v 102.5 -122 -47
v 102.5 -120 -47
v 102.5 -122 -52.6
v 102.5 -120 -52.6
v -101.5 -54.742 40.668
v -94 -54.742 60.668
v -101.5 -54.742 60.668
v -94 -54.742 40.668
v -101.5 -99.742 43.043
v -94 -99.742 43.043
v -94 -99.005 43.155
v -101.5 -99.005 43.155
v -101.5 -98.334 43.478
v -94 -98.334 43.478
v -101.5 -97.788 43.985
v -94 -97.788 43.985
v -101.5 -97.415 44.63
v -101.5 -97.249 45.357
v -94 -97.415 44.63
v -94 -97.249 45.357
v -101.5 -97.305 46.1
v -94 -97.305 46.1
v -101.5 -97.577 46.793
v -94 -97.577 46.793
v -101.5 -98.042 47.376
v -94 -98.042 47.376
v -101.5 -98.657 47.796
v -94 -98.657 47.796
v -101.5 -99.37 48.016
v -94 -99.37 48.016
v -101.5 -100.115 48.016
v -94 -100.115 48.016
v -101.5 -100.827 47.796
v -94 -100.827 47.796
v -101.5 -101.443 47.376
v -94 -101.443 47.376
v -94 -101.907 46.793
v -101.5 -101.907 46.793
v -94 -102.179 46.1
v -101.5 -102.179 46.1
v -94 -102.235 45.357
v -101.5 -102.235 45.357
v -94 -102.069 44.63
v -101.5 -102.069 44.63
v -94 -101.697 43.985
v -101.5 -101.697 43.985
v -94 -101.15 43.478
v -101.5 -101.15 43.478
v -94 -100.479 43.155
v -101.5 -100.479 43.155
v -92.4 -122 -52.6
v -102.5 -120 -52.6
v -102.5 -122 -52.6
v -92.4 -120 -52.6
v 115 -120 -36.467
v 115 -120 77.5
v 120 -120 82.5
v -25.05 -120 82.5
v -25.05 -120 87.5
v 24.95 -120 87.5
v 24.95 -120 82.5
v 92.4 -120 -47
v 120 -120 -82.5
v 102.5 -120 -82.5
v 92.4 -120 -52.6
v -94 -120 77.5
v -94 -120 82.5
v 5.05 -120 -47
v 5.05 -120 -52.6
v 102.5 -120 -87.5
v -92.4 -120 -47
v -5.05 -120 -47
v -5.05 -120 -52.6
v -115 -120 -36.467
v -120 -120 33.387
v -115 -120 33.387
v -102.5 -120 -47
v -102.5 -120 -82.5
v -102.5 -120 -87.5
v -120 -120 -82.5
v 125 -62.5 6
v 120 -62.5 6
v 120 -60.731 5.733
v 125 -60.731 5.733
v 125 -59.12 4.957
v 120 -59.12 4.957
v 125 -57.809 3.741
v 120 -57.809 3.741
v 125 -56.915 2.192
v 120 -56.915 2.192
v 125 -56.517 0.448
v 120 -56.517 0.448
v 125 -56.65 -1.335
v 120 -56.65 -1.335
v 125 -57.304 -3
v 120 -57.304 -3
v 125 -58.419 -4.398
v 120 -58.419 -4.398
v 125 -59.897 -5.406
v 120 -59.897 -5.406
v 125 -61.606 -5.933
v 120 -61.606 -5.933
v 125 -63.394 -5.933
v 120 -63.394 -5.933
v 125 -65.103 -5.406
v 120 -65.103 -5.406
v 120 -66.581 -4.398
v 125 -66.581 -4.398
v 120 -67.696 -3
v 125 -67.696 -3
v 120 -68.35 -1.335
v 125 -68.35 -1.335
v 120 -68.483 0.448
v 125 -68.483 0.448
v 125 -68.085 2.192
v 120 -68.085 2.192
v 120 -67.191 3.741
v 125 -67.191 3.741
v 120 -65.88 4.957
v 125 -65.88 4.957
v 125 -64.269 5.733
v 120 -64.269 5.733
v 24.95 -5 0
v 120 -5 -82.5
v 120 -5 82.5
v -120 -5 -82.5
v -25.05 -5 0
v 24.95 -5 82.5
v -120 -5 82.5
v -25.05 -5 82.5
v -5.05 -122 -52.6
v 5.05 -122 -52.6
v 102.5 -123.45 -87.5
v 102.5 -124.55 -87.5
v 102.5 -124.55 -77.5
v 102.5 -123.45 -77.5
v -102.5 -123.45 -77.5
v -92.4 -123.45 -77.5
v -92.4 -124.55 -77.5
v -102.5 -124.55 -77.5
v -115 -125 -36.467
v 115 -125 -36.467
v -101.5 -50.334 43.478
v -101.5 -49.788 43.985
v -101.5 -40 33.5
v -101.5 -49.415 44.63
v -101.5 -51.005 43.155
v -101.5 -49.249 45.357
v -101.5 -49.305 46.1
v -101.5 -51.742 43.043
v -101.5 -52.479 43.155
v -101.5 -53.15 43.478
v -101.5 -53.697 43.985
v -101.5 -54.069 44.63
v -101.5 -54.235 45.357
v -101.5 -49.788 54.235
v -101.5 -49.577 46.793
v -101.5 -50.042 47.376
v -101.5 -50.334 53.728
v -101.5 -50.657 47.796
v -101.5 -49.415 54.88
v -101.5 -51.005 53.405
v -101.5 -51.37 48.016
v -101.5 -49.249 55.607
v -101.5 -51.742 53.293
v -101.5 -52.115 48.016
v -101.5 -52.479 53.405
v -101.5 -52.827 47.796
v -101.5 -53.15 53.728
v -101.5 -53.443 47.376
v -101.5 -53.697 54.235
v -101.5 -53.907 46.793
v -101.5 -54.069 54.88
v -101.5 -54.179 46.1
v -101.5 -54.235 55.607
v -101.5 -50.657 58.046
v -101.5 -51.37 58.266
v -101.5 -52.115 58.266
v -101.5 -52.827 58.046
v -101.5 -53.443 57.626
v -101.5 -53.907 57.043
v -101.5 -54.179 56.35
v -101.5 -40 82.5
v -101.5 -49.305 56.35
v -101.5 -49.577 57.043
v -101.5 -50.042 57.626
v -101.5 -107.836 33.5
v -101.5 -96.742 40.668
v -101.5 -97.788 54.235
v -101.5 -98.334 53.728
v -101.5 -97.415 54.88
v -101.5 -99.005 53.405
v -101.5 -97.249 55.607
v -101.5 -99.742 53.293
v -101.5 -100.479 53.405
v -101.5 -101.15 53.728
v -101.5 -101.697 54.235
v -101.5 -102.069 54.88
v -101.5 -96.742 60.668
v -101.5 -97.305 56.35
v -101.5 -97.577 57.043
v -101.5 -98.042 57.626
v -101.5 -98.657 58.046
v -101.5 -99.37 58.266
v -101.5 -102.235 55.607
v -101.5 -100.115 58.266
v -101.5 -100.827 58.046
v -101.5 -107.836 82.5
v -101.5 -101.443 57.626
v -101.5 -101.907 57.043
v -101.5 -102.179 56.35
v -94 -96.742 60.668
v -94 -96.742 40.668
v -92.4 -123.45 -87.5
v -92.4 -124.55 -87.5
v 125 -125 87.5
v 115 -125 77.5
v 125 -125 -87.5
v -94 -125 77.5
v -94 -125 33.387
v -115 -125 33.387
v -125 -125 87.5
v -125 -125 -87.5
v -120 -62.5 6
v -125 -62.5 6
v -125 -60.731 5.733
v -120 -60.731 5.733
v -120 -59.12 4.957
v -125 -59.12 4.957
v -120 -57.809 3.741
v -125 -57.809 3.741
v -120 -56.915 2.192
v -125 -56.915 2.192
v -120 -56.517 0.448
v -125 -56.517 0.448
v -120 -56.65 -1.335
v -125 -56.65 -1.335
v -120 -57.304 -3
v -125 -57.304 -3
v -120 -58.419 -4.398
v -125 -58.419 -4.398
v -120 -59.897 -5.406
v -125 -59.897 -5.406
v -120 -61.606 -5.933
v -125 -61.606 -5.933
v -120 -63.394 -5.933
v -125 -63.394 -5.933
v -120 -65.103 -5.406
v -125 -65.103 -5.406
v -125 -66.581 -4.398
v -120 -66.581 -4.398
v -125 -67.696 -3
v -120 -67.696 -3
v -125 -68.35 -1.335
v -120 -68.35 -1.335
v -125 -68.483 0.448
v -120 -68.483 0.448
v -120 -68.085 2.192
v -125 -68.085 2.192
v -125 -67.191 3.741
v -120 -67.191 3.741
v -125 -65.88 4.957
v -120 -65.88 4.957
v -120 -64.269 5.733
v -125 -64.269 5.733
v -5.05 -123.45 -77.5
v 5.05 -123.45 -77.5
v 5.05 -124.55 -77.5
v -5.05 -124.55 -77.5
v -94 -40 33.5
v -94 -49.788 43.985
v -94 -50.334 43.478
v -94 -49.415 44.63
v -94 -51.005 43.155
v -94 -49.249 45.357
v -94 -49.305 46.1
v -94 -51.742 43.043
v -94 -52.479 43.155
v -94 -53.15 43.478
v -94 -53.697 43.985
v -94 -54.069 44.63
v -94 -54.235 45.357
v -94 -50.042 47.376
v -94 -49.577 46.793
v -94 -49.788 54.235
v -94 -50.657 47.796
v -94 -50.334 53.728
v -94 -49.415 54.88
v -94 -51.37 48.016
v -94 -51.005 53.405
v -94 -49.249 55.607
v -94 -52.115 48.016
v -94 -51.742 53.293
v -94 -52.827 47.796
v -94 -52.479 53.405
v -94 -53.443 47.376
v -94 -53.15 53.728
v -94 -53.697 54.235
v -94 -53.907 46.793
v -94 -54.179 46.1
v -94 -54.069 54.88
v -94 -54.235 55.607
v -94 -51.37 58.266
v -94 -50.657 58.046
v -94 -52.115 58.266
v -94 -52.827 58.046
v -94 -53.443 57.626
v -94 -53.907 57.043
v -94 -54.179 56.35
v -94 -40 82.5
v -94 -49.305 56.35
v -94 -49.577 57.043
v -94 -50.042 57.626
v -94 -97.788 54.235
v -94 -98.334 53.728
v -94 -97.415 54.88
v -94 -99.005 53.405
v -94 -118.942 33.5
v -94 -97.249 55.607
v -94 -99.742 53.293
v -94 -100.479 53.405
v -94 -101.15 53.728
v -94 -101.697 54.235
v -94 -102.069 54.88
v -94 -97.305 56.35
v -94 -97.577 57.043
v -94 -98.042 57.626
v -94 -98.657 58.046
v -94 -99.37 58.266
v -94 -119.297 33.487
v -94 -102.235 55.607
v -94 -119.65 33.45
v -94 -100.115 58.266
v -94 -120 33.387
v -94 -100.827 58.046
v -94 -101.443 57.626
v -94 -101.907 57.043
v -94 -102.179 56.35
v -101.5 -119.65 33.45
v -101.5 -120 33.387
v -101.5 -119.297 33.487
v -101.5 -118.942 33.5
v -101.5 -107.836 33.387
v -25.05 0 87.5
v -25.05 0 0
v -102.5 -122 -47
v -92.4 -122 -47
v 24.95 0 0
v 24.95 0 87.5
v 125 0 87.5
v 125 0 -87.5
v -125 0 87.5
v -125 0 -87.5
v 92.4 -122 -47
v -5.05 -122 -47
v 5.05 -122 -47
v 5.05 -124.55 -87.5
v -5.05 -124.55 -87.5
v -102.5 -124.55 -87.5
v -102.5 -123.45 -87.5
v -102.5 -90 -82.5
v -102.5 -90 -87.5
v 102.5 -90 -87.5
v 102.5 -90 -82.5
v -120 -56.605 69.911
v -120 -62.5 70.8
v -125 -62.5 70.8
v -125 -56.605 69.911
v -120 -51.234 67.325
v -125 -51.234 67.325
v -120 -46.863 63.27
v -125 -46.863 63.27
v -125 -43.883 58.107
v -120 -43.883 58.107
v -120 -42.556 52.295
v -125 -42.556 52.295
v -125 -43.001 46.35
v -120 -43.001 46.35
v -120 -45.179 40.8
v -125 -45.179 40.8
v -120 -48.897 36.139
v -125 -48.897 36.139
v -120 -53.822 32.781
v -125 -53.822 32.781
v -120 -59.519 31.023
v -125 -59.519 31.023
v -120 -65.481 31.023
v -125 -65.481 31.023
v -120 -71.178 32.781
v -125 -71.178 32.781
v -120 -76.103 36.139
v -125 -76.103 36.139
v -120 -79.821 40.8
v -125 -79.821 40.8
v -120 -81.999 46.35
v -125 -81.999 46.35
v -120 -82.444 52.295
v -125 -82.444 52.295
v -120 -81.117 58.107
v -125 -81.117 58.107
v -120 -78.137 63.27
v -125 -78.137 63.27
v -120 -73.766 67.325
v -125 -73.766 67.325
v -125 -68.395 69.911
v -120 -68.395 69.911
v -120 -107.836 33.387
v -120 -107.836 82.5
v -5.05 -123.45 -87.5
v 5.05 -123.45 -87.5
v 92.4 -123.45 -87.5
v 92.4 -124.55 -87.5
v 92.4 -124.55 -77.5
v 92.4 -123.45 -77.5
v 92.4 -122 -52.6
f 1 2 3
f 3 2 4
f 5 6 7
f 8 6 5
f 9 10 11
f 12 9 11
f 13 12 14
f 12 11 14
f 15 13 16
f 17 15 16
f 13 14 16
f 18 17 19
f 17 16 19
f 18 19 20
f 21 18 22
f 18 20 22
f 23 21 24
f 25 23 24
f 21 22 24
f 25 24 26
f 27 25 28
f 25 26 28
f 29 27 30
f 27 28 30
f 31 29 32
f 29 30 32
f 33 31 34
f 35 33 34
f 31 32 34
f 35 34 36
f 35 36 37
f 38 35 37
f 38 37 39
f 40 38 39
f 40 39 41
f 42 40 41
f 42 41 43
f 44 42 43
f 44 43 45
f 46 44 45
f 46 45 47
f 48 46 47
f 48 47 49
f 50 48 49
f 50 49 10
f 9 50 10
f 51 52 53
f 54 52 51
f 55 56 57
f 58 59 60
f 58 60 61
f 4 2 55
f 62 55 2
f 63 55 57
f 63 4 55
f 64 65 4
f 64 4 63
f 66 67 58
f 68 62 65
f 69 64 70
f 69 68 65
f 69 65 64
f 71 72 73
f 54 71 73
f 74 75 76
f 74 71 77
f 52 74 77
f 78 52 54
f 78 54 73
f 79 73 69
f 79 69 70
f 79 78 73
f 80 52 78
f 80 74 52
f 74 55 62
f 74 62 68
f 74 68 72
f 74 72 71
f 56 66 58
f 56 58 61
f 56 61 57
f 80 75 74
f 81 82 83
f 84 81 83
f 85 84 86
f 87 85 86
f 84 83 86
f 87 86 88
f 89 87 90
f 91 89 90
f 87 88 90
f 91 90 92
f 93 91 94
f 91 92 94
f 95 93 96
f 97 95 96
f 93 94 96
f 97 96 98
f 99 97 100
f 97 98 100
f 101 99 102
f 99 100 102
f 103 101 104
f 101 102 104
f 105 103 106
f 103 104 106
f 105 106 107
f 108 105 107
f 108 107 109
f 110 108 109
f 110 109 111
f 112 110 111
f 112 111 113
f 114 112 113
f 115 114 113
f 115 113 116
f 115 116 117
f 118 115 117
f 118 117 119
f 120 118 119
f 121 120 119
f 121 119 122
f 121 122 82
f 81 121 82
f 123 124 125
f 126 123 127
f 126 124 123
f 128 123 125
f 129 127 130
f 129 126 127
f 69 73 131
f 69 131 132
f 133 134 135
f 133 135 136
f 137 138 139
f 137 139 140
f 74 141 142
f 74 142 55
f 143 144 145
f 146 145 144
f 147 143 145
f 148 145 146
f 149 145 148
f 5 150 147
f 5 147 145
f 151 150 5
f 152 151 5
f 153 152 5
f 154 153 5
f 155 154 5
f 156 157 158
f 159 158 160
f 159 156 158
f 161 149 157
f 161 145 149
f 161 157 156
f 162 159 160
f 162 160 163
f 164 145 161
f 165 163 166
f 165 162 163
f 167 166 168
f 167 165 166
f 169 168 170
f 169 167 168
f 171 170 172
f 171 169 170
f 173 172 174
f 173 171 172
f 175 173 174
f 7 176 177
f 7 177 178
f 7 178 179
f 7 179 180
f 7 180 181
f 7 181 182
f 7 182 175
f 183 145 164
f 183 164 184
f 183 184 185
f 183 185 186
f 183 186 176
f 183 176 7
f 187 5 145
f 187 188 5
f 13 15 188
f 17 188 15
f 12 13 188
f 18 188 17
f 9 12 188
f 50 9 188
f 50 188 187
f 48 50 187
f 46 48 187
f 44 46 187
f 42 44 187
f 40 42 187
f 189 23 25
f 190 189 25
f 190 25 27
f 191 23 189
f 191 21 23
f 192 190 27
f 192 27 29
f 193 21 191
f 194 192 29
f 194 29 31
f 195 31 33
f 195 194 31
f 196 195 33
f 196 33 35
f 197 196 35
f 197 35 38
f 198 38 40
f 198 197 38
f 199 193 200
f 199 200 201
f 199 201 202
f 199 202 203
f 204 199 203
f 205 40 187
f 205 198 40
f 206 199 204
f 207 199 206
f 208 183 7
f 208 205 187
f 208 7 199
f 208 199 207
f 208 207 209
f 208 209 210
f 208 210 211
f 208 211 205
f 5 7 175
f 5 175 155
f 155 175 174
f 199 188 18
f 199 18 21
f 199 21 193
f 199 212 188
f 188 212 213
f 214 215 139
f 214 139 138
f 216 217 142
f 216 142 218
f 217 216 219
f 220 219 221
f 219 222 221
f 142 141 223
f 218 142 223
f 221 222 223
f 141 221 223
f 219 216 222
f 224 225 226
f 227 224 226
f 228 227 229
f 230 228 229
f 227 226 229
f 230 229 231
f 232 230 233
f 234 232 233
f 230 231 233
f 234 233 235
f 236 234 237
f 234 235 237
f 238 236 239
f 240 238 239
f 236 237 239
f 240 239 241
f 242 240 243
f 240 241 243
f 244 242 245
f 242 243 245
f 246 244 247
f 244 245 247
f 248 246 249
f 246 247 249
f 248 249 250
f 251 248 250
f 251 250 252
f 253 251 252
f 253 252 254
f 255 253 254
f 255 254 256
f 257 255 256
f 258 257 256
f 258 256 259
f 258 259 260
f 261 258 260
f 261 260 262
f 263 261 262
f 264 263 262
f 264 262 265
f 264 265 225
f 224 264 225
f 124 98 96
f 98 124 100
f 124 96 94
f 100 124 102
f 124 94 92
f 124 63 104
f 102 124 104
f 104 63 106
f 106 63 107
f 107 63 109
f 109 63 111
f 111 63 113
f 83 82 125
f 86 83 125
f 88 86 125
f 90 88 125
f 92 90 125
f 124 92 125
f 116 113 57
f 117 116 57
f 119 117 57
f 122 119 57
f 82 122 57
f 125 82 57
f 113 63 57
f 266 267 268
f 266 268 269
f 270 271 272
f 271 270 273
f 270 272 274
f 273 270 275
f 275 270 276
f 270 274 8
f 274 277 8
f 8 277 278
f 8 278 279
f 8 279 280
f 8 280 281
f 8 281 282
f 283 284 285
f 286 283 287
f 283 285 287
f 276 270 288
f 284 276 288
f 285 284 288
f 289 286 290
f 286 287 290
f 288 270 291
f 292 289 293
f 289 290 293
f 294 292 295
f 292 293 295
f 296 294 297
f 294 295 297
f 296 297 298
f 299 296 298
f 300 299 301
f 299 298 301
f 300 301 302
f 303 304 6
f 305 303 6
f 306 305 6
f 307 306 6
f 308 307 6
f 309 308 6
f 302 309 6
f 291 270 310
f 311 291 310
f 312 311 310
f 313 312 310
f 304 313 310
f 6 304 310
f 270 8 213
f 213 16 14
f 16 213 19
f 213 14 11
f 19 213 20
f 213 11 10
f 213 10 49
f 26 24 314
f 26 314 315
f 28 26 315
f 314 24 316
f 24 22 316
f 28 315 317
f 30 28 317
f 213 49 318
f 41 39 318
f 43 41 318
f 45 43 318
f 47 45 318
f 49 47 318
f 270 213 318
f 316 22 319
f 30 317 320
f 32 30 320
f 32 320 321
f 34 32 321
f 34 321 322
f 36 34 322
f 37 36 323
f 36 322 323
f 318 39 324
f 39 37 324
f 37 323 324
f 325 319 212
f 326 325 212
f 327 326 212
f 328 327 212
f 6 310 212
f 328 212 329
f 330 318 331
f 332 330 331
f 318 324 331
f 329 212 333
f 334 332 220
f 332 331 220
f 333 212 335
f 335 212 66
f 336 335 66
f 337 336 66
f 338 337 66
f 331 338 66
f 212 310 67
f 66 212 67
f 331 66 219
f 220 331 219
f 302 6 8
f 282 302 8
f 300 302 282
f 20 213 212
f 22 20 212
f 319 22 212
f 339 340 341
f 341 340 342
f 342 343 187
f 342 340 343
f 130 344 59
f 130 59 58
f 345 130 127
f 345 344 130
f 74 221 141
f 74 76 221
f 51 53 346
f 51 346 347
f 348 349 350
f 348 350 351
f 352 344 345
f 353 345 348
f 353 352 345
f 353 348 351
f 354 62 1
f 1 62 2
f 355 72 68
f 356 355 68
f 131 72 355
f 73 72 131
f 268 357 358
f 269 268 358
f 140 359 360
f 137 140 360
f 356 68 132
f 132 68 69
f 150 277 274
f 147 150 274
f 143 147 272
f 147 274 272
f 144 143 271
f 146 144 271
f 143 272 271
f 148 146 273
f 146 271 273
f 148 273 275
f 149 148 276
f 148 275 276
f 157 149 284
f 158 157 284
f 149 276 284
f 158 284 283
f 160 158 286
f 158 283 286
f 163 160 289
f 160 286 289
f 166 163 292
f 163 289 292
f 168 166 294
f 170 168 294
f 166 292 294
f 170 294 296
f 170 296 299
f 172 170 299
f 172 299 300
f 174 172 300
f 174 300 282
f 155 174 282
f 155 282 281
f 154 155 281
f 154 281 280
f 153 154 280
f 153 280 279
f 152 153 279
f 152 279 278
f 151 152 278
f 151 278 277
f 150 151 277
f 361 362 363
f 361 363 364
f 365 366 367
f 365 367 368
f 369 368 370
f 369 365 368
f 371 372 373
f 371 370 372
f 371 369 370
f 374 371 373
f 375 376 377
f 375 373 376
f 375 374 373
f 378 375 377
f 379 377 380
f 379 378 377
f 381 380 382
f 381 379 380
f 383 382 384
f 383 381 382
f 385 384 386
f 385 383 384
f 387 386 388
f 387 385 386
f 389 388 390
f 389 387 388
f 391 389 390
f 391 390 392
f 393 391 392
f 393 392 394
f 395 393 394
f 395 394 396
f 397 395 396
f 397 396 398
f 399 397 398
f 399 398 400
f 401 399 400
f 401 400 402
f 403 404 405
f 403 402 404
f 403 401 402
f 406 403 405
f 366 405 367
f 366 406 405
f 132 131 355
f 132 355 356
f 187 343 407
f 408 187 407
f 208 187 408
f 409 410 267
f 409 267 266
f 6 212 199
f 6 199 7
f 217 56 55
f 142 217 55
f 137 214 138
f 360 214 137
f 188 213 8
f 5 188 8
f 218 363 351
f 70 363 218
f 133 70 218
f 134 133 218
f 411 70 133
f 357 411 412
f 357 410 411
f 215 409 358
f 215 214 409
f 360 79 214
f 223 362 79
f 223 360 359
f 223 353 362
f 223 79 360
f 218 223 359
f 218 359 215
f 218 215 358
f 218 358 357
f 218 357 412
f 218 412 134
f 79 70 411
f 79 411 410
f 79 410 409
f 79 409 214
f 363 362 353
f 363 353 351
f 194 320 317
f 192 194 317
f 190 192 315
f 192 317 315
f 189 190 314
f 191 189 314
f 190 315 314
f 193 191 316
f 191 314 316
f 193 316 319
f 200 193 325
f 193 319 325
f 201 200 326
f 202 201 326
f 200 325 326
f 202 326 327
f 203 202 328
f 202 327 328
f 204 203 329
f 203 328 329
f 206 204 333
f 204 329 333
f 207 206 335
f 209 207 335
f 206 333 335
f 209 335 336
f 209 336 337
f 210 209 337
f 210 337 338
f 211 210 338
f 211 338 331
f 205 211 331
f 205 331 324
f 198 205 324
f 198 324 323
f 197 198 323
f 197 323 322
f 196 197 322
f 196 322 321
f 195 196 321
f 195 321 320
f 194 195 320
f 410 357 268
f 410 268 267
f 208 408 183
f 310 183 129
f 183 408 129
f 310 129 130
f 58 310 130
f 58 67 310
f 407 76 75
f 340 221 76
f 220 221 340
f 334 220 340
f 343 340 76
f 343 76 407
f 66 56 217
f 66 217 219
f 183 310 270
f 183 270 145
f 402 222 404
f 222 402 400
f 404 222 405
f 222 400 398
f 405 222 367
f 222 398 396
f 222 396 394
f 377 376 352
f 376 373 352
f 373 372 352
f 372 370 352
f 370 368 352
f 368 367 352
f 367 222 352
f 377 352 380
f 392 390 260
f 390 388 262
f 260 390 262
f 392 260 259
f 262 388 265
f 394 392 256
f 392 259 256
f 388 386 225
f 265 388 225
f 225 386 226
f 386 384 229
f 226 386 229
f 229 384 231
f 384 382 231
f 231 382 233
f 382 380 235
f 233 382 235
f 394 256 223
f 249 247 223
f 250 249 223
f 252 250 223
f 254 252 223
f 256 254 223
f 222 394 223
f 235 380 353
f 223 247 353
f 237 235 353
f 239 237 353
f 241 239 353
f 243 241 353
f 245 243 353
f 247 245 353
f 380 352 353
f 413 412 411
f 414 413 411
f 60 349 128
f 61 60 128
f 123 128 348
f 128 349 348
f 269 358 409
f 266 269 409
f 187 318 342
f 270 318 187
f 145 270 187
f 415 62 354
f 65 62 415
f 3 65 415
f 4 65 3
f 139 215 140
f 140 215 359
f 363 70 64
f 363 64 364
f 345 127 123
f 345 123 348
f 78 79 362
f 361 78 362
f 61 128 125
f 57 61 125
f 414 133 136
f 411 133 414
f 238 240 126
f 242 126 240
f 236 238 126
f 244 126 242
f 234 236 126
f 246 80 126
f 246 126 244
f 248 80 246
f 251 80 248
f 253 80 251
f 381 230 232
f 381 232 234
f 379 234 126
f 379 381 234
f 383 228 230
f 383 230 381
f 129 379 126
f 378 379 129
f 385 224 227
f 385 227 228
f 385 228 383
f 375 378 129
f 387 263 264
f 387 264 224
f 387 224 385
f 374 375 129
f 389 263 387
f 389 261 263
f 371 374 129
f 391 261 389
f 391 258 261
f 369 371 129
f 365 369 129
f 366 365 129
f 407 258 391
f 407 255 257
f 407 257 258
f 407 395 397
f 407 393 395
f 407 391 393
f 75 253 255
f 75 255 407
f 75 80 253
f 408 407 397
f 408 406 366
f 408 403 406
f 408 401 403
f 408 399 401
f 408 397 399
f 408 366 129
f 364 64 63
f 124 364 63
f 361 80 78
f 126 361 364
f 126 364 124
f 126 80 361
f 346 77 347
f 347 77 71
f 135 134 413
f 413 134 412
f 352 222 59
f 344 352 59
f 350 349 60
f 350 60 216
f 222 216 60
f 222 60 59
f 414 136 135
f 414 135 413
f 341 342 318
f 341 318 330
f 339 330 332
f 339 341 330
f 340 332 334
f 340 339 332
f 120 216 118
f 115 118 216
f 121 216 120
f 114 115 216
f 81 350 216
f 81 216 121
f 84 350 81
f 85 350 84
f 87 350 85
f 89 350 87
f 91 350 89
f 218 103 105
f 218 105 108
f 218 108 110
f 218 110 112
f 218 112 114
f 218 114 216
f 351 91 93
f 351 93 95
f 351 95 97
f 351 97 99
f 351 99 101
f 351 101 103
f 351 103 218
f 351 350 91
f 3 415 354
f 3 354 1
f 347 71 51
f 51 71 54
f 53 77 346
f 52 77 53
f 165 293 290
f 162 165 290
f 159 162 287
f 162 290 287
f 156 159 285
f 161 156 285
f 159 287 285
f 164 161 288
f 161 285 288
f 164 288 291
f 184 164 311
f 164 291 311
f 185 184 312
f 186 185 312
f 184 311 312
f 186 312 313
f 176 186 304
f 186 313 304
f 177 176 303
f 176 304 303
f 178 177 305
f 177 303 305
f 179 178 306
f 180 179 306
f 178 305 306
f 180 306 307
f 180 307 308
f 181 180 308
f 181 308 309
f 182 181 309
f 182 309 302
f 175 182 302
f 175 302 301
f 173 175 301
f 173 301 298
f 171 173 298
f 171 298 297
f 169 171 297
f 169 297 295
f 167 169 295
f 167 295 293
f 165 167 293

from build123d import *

# Parameters (mm, degrees)
SKETCH1_W               = 250
SKETCH1_H               = 175
BOSS_EXTRUDE1_DEPTH     = 125
SKETCH2_W               = 240
SKETCH2_H               = 165
CUT_EXTRUDE1_DEPTH      = 120
SKETCH3_W               = 40.1
SKETCH3_H               = 165
CUT_EXTRUDE2_DEPTH      = 198.246672976
SKETCH6_W               = 250
SKETCH6_H               = 175
BOSS_EXTRUDE2_DEPTH     = 5
SKETCH7_W               = 205
SKETCH7_H               = 30
PIANO_PLUG_DEPTH        = 5
ARM_HOLE_REACH          = 199.247
SKETCH8_W               = 50
SKETCH8_H               = 180
BOSS_EXTRUDE8_REACH     = 216.001
SKETCH4_R               = 6
MAIN_SHAFT_HOLE_DEPTH   = 293.884362846
CUT_EXTRUDE8_DEPTH      = 16
CUT_EXTRUDE8_DEPTH_BACK = 33
SKETCH10_R              = 20
BOTTOM_OPEN_DEPTH       = 28
BOTTOM_OPEN_DEPTH_BACK  = 21
SKETCH11_W              = 230
SKETCH11_H              = 155
SKETCH12_W              = 41.033462292
SKETCH12_H              = 5
BOSS_EXTRUDE4_DEPTH     = 233
SKETCH13_W              = 7.5
SKETCH13_H              = 80
BOSS_EXTRUDE5_DEPTH     = 49
SKETCH14_W              = 44.113211518
SKETCH14_H              = 5
BOSS_EXTRUDE6_DEPTH     = 21
FILLET2_R               = 5
SKETCH16_R              = 2.5
SKETCH16_W              = 20
SKETCH16_H              = 42
SERVO_PLUG_HOLE_DEPTH   = 106
SKETCH17_W              = 49.113211518
SKETCH17_H              = 12.164138601
BOSS_EXTRUDE7_DEPTH     = 23
SKETCH19_W              = 10.1
SKETCH19_H              = 5.6
CUT_EXTRUDE9_DEPTH      = 2
SKETCH21_W              = 10.1
SKETCH21_H              = 1.1
CUT_EXTRUDE10_DEPTH     = 10


with BuildPart() as part:
    # Sketch1 → Boss-Extrude1 (new body)
    with BuildSketch(Plane(origin=(0, 0, 0), x_dir=(1, 0, 0), z_dir=(0, 1, 0))):
        Rectangle(SKETCH1_W, SKETCH1_H)
    extrude(amount=-BOSS_EXTRUDE1_DEPTH)

    # Sketch2 → Cut-Extrude1 (cut)
    with BuildSketch(Plane.XZ.offset(125)):
        Rectangle(SKETCH2_W, SKETCH2_H)
    extrude(amount=-CUT_EXTRUDE1_DEPTH, mode=Mode.SUBTRACT)

    # Sketch3 → Cut-Extrude2 (cut, through all)
    with BuildSketch(Plane(origin=(0, 0, 0), x_dir=(1, 0, 0), z_dir=(0, 1, 0))):
        Rectangle(SKETCH3_W, SKETCH3_H)
    extrude(amount=-CUT_EXTRUDE2_DEPTH, mode=Mode.SUBTRACT)

    # Sketch6 → Boss-Extrude2 (add)
    with BuildSketch(Plane.XZ.offset(125)):
        Rectangle(SKETCH6_W, SKETCH6_H)
    extrude(amount=-BOSS_EXTRUDE2_DEPTH)

    # Sketch7 → Piano Plug (cut)
    with BuildSketch(Plane(origin=(0, 0, -87.5), x_dir=(-1, 0, 0), z_dir=(0, 0, -1))):
        with Locations((0, -105)):
            Rectangle(SKETCH7_W, SKETCH7_H)
    extrude(amount=-PIANO_PLUG_DEPTH, mode=Mode.SUBTRACT)

    # Arm Hole: up to this face of the body (flat: up to its plane)
    arm_hole_end = Plane(part.part.faces().sort_by_distance((0, -120, -2.144615385))[0])
    # Sketch8 → Arm Hole (cut, up to the picked face)
    with BuildSketch(Plane(origin=(0, 0, 0), x_dir=(1, 0, 0), z_dir=(0, 1, 0)), mode=Mode.PRIVATE) as arm_hole_sk1:
        with Locations((-0.05, -2.5)):
            Rectangle(SKETCH8_W, SKETCH8_H)
    arm_hole_tool1 = split(extrude(arm_hole_sk1.sketch, amount=-ARM_HOLE_REACH, mode=Mode.PRIVATE), bisect_by=arm_hole_end, keep=Keep.BOTH, mode=Mode.PRIVATE)
    add(arm_hole_tool1.solids().sort_by(Axis((-0.05, 0, 2.5), (0, -1, 0)))[0], mode=Mode.SUBTRACT)

    # Sketch9 → Boss-Extrude8 (add, up to next)
    with BuildSketch(Plane(origin=(-25.05, 0, 0), x_dir=(0, 0, -1), z_dir=(1, 0, 0)), mode=Mode.PRIVATE) as boss_extrude8_sk1:
        Polygon((87.5, 0), (87.5, -90), (82.5, -90), (82.5, -5), (0, -5), (0, 0), align=None)
    boss_extrude8_tool1 = extrude(boss_extrude8_sk1.sketch, amount=BOSS_EXTRUDE8_REACH, mode=Mode.PRIVATE) - part.part
    add(boss_extrude8_tool1.solids().sort_by_distance((-25.05, -45, -86.244761))[0])

    # Sketch4 → Main Shaft Hole (cut, through all)
    with BuildSketch(Plane.ZY.offset(125)):
        with Locations((0, -62.5)):
            Circle(SKETCH4_R)
    extrude(amount=-MAIN_SHAFT_HOLE_DEPTH, mode=Mode.SUBTRACT)

    # Sketch10 → Cut-Extrude8 (cut, two sides: drawn at the far end of the back side and taken through both)
    with BuildSketch(Plane.ZY.offset(125).offset(-CUT_EXTRUDE8_DEPTH_BACK)):
        with Locations((50.8, -62.5)):
            Circle(SKETCH10_R)
    extrude(amount=CUT_EXTRUDE8_DEPTH + CUT_EXTRUDE8_DEPTH_BACK, mode=Mode.SUBTRACT)

    # Sketch11 → Bottom Open (cut, two sides: drawn at the far end of the back side and taken through both)
    with BuildSketch(Plane(origin=(0, -125, 0), x_dir=(-1, 0, 0), z_dir=(0, -1, 0)).offset(-BOTTOM_OPEN_DEPTH_BACK)):
        Rectangle(SKETCH11_W, SKETCH11_H)
    extrude(amount=BOTTOM_OPEN_DEPTH + BOTTOM_OPEN_DEPTH_BACK, mode=Mode.SUBTRACT)

    # Sketch12 → Boss-Extrude4 (add)
    with BuildSketch(Plane(origin=(-115, 0, 0), x_dir=(0, 0, -1), z_dir=(1, 0, 0))):
        with Locations((56.983268854, -122.5)):
            Rectangle(SKETCH12_W, SKETCH12_H)
    extrude(amount=BOSS_EXTRUDE4_DEPTH)

    # Sketch13 → Boss-Extrude5 (add)
    with BuildSketch(Plane(origin=(0, 0, 82.5), x_dir=(-1, 0, 0), z_dir=(0, 0, -1))):
        with Locations((97.75, -80)):
            Rectangle(SKETCH13_W, SKETCH13_H)
    extrude(amount=BOSS_EXTRUDE5_DEPTH)

    # Sketch14 → Boss-Extrude6 (add)
    with BuildSketch(Plane(origin=(-115, 0, 0), x_dir=(0, 0, -1), z_dir=(1, 0, 0))):
        with Locations((-55.443394241, -122.5)):
            Rectangle(SKETCH14_W, SKETCH14_H)
    extrude(amount=BOSS_EXTRUDE6_DEPTH)

    # Fillet2
    # the kernel refuses this fillet: 5 mm, written as the material it adds along each edge
    with BuildSketch(Plane(origin=(-101.5, -120, 33.5), x_dir=(0, 1, 0), z_dir=(1, 0, 0))) as fillet2_piece_1:
        with BuildLine():
            CenterArc((1.057968965, -5), FILLET2_R, 90, 12.215768954)
            Line((0, -0.113211518), (-0.021159379, -0.015475748))
            ThreePointArc((-0.021159379, -0.015475748), (-0.1, -0.056605759), (-0.1, 0))
            Line((-0.1, 0), (0, 0.1))
            Line((0, 0.1), (1.057968965, 0.1))
            Line((1.057968965, 0.1), (1.057968965, 0))
        make_face()
    extrude(amount=7.5)

    # Sketch16 → Servo Plug Hole (cut)
    with BuildSketch(Plane(origin=(0, 0, 0), x_dir=(0, 0, -1), z_dir=(1, 0, 0))):
        with Locations((-45.543439041, -51.74216133)):
            Circle(SKETCH16_R)
        with Locations((-55.793439041, -51.74216133)):
            Circle(SKETCH16_R)
        with Locations((-50.668439041, -75.74216133)):
            Rectangle(SKETCH16_W, SKETCH16_H)
        with Locations((-45.543439041, -99.74216133)):
            Circle(SKETCH16_R)
        with Locations((-55.793439041, -99.74216133)):
            Circle(SKETCH16_R)
    extrude(amount=-SERVO_PLUG_HOLE_DEPTH, mode=Mode.SUBTRACT)

    # Sketch17 → Boss-Extrude7 (add)
    with BuildSketch(Plane.ZY.offset(101.5)):
        with Locations((57.943394241, -113.9179307)):
            Rectangle(SKETCH17_W, SKETCH17_H)
    extrude(amount=BOSS_EXTRUDE7_DEPTH)

    # Sketch19 → Cut-Extrude9 (cut)
    with BuildSketch(Plane(origin=(0, -120, 0), x_dir=(1, 0, 0), z_dir=(0, 1, 0))):
        with Locations((97.45, 49.8)):
            Rectangle(SKETCH19_W, SKETCH19_H)
        with Locations((-97.45, 49.8)):
            Rectangle(SKETCH19_W, SKETCH19_H)
        with Locations((0, 49.8)):
            Rectangle(SKETCH19_W, SKETCH19_H)
    extrude(amount=-CUT_EXTRUDE9_DEPTH, mode=Mode.SUBTRACT)

    # Sketch21 → Cut-Extrude10 (cut)
    with BuildSketch(Plane(origin=(0, 0, -87.5), x_dir=(-1, 0, 0), z_dir=(0, 0, -1))):
        with Locations((-97.45, -124)):
            Rectangle(SKETCH21_W, SKETCH21_H)
        with Locations((97.45, -124)):
            Rectangle(SKETCH21_W, SKETCH21_H)
        with Locations((0, -124)):
            Rectangle(SKETCH21_W, SKETCH21_H)
    extrude(amount=-CUT_EXTRUDE10_DEPTH, mode=Mode.SUBTRACT)


solid = part.part
